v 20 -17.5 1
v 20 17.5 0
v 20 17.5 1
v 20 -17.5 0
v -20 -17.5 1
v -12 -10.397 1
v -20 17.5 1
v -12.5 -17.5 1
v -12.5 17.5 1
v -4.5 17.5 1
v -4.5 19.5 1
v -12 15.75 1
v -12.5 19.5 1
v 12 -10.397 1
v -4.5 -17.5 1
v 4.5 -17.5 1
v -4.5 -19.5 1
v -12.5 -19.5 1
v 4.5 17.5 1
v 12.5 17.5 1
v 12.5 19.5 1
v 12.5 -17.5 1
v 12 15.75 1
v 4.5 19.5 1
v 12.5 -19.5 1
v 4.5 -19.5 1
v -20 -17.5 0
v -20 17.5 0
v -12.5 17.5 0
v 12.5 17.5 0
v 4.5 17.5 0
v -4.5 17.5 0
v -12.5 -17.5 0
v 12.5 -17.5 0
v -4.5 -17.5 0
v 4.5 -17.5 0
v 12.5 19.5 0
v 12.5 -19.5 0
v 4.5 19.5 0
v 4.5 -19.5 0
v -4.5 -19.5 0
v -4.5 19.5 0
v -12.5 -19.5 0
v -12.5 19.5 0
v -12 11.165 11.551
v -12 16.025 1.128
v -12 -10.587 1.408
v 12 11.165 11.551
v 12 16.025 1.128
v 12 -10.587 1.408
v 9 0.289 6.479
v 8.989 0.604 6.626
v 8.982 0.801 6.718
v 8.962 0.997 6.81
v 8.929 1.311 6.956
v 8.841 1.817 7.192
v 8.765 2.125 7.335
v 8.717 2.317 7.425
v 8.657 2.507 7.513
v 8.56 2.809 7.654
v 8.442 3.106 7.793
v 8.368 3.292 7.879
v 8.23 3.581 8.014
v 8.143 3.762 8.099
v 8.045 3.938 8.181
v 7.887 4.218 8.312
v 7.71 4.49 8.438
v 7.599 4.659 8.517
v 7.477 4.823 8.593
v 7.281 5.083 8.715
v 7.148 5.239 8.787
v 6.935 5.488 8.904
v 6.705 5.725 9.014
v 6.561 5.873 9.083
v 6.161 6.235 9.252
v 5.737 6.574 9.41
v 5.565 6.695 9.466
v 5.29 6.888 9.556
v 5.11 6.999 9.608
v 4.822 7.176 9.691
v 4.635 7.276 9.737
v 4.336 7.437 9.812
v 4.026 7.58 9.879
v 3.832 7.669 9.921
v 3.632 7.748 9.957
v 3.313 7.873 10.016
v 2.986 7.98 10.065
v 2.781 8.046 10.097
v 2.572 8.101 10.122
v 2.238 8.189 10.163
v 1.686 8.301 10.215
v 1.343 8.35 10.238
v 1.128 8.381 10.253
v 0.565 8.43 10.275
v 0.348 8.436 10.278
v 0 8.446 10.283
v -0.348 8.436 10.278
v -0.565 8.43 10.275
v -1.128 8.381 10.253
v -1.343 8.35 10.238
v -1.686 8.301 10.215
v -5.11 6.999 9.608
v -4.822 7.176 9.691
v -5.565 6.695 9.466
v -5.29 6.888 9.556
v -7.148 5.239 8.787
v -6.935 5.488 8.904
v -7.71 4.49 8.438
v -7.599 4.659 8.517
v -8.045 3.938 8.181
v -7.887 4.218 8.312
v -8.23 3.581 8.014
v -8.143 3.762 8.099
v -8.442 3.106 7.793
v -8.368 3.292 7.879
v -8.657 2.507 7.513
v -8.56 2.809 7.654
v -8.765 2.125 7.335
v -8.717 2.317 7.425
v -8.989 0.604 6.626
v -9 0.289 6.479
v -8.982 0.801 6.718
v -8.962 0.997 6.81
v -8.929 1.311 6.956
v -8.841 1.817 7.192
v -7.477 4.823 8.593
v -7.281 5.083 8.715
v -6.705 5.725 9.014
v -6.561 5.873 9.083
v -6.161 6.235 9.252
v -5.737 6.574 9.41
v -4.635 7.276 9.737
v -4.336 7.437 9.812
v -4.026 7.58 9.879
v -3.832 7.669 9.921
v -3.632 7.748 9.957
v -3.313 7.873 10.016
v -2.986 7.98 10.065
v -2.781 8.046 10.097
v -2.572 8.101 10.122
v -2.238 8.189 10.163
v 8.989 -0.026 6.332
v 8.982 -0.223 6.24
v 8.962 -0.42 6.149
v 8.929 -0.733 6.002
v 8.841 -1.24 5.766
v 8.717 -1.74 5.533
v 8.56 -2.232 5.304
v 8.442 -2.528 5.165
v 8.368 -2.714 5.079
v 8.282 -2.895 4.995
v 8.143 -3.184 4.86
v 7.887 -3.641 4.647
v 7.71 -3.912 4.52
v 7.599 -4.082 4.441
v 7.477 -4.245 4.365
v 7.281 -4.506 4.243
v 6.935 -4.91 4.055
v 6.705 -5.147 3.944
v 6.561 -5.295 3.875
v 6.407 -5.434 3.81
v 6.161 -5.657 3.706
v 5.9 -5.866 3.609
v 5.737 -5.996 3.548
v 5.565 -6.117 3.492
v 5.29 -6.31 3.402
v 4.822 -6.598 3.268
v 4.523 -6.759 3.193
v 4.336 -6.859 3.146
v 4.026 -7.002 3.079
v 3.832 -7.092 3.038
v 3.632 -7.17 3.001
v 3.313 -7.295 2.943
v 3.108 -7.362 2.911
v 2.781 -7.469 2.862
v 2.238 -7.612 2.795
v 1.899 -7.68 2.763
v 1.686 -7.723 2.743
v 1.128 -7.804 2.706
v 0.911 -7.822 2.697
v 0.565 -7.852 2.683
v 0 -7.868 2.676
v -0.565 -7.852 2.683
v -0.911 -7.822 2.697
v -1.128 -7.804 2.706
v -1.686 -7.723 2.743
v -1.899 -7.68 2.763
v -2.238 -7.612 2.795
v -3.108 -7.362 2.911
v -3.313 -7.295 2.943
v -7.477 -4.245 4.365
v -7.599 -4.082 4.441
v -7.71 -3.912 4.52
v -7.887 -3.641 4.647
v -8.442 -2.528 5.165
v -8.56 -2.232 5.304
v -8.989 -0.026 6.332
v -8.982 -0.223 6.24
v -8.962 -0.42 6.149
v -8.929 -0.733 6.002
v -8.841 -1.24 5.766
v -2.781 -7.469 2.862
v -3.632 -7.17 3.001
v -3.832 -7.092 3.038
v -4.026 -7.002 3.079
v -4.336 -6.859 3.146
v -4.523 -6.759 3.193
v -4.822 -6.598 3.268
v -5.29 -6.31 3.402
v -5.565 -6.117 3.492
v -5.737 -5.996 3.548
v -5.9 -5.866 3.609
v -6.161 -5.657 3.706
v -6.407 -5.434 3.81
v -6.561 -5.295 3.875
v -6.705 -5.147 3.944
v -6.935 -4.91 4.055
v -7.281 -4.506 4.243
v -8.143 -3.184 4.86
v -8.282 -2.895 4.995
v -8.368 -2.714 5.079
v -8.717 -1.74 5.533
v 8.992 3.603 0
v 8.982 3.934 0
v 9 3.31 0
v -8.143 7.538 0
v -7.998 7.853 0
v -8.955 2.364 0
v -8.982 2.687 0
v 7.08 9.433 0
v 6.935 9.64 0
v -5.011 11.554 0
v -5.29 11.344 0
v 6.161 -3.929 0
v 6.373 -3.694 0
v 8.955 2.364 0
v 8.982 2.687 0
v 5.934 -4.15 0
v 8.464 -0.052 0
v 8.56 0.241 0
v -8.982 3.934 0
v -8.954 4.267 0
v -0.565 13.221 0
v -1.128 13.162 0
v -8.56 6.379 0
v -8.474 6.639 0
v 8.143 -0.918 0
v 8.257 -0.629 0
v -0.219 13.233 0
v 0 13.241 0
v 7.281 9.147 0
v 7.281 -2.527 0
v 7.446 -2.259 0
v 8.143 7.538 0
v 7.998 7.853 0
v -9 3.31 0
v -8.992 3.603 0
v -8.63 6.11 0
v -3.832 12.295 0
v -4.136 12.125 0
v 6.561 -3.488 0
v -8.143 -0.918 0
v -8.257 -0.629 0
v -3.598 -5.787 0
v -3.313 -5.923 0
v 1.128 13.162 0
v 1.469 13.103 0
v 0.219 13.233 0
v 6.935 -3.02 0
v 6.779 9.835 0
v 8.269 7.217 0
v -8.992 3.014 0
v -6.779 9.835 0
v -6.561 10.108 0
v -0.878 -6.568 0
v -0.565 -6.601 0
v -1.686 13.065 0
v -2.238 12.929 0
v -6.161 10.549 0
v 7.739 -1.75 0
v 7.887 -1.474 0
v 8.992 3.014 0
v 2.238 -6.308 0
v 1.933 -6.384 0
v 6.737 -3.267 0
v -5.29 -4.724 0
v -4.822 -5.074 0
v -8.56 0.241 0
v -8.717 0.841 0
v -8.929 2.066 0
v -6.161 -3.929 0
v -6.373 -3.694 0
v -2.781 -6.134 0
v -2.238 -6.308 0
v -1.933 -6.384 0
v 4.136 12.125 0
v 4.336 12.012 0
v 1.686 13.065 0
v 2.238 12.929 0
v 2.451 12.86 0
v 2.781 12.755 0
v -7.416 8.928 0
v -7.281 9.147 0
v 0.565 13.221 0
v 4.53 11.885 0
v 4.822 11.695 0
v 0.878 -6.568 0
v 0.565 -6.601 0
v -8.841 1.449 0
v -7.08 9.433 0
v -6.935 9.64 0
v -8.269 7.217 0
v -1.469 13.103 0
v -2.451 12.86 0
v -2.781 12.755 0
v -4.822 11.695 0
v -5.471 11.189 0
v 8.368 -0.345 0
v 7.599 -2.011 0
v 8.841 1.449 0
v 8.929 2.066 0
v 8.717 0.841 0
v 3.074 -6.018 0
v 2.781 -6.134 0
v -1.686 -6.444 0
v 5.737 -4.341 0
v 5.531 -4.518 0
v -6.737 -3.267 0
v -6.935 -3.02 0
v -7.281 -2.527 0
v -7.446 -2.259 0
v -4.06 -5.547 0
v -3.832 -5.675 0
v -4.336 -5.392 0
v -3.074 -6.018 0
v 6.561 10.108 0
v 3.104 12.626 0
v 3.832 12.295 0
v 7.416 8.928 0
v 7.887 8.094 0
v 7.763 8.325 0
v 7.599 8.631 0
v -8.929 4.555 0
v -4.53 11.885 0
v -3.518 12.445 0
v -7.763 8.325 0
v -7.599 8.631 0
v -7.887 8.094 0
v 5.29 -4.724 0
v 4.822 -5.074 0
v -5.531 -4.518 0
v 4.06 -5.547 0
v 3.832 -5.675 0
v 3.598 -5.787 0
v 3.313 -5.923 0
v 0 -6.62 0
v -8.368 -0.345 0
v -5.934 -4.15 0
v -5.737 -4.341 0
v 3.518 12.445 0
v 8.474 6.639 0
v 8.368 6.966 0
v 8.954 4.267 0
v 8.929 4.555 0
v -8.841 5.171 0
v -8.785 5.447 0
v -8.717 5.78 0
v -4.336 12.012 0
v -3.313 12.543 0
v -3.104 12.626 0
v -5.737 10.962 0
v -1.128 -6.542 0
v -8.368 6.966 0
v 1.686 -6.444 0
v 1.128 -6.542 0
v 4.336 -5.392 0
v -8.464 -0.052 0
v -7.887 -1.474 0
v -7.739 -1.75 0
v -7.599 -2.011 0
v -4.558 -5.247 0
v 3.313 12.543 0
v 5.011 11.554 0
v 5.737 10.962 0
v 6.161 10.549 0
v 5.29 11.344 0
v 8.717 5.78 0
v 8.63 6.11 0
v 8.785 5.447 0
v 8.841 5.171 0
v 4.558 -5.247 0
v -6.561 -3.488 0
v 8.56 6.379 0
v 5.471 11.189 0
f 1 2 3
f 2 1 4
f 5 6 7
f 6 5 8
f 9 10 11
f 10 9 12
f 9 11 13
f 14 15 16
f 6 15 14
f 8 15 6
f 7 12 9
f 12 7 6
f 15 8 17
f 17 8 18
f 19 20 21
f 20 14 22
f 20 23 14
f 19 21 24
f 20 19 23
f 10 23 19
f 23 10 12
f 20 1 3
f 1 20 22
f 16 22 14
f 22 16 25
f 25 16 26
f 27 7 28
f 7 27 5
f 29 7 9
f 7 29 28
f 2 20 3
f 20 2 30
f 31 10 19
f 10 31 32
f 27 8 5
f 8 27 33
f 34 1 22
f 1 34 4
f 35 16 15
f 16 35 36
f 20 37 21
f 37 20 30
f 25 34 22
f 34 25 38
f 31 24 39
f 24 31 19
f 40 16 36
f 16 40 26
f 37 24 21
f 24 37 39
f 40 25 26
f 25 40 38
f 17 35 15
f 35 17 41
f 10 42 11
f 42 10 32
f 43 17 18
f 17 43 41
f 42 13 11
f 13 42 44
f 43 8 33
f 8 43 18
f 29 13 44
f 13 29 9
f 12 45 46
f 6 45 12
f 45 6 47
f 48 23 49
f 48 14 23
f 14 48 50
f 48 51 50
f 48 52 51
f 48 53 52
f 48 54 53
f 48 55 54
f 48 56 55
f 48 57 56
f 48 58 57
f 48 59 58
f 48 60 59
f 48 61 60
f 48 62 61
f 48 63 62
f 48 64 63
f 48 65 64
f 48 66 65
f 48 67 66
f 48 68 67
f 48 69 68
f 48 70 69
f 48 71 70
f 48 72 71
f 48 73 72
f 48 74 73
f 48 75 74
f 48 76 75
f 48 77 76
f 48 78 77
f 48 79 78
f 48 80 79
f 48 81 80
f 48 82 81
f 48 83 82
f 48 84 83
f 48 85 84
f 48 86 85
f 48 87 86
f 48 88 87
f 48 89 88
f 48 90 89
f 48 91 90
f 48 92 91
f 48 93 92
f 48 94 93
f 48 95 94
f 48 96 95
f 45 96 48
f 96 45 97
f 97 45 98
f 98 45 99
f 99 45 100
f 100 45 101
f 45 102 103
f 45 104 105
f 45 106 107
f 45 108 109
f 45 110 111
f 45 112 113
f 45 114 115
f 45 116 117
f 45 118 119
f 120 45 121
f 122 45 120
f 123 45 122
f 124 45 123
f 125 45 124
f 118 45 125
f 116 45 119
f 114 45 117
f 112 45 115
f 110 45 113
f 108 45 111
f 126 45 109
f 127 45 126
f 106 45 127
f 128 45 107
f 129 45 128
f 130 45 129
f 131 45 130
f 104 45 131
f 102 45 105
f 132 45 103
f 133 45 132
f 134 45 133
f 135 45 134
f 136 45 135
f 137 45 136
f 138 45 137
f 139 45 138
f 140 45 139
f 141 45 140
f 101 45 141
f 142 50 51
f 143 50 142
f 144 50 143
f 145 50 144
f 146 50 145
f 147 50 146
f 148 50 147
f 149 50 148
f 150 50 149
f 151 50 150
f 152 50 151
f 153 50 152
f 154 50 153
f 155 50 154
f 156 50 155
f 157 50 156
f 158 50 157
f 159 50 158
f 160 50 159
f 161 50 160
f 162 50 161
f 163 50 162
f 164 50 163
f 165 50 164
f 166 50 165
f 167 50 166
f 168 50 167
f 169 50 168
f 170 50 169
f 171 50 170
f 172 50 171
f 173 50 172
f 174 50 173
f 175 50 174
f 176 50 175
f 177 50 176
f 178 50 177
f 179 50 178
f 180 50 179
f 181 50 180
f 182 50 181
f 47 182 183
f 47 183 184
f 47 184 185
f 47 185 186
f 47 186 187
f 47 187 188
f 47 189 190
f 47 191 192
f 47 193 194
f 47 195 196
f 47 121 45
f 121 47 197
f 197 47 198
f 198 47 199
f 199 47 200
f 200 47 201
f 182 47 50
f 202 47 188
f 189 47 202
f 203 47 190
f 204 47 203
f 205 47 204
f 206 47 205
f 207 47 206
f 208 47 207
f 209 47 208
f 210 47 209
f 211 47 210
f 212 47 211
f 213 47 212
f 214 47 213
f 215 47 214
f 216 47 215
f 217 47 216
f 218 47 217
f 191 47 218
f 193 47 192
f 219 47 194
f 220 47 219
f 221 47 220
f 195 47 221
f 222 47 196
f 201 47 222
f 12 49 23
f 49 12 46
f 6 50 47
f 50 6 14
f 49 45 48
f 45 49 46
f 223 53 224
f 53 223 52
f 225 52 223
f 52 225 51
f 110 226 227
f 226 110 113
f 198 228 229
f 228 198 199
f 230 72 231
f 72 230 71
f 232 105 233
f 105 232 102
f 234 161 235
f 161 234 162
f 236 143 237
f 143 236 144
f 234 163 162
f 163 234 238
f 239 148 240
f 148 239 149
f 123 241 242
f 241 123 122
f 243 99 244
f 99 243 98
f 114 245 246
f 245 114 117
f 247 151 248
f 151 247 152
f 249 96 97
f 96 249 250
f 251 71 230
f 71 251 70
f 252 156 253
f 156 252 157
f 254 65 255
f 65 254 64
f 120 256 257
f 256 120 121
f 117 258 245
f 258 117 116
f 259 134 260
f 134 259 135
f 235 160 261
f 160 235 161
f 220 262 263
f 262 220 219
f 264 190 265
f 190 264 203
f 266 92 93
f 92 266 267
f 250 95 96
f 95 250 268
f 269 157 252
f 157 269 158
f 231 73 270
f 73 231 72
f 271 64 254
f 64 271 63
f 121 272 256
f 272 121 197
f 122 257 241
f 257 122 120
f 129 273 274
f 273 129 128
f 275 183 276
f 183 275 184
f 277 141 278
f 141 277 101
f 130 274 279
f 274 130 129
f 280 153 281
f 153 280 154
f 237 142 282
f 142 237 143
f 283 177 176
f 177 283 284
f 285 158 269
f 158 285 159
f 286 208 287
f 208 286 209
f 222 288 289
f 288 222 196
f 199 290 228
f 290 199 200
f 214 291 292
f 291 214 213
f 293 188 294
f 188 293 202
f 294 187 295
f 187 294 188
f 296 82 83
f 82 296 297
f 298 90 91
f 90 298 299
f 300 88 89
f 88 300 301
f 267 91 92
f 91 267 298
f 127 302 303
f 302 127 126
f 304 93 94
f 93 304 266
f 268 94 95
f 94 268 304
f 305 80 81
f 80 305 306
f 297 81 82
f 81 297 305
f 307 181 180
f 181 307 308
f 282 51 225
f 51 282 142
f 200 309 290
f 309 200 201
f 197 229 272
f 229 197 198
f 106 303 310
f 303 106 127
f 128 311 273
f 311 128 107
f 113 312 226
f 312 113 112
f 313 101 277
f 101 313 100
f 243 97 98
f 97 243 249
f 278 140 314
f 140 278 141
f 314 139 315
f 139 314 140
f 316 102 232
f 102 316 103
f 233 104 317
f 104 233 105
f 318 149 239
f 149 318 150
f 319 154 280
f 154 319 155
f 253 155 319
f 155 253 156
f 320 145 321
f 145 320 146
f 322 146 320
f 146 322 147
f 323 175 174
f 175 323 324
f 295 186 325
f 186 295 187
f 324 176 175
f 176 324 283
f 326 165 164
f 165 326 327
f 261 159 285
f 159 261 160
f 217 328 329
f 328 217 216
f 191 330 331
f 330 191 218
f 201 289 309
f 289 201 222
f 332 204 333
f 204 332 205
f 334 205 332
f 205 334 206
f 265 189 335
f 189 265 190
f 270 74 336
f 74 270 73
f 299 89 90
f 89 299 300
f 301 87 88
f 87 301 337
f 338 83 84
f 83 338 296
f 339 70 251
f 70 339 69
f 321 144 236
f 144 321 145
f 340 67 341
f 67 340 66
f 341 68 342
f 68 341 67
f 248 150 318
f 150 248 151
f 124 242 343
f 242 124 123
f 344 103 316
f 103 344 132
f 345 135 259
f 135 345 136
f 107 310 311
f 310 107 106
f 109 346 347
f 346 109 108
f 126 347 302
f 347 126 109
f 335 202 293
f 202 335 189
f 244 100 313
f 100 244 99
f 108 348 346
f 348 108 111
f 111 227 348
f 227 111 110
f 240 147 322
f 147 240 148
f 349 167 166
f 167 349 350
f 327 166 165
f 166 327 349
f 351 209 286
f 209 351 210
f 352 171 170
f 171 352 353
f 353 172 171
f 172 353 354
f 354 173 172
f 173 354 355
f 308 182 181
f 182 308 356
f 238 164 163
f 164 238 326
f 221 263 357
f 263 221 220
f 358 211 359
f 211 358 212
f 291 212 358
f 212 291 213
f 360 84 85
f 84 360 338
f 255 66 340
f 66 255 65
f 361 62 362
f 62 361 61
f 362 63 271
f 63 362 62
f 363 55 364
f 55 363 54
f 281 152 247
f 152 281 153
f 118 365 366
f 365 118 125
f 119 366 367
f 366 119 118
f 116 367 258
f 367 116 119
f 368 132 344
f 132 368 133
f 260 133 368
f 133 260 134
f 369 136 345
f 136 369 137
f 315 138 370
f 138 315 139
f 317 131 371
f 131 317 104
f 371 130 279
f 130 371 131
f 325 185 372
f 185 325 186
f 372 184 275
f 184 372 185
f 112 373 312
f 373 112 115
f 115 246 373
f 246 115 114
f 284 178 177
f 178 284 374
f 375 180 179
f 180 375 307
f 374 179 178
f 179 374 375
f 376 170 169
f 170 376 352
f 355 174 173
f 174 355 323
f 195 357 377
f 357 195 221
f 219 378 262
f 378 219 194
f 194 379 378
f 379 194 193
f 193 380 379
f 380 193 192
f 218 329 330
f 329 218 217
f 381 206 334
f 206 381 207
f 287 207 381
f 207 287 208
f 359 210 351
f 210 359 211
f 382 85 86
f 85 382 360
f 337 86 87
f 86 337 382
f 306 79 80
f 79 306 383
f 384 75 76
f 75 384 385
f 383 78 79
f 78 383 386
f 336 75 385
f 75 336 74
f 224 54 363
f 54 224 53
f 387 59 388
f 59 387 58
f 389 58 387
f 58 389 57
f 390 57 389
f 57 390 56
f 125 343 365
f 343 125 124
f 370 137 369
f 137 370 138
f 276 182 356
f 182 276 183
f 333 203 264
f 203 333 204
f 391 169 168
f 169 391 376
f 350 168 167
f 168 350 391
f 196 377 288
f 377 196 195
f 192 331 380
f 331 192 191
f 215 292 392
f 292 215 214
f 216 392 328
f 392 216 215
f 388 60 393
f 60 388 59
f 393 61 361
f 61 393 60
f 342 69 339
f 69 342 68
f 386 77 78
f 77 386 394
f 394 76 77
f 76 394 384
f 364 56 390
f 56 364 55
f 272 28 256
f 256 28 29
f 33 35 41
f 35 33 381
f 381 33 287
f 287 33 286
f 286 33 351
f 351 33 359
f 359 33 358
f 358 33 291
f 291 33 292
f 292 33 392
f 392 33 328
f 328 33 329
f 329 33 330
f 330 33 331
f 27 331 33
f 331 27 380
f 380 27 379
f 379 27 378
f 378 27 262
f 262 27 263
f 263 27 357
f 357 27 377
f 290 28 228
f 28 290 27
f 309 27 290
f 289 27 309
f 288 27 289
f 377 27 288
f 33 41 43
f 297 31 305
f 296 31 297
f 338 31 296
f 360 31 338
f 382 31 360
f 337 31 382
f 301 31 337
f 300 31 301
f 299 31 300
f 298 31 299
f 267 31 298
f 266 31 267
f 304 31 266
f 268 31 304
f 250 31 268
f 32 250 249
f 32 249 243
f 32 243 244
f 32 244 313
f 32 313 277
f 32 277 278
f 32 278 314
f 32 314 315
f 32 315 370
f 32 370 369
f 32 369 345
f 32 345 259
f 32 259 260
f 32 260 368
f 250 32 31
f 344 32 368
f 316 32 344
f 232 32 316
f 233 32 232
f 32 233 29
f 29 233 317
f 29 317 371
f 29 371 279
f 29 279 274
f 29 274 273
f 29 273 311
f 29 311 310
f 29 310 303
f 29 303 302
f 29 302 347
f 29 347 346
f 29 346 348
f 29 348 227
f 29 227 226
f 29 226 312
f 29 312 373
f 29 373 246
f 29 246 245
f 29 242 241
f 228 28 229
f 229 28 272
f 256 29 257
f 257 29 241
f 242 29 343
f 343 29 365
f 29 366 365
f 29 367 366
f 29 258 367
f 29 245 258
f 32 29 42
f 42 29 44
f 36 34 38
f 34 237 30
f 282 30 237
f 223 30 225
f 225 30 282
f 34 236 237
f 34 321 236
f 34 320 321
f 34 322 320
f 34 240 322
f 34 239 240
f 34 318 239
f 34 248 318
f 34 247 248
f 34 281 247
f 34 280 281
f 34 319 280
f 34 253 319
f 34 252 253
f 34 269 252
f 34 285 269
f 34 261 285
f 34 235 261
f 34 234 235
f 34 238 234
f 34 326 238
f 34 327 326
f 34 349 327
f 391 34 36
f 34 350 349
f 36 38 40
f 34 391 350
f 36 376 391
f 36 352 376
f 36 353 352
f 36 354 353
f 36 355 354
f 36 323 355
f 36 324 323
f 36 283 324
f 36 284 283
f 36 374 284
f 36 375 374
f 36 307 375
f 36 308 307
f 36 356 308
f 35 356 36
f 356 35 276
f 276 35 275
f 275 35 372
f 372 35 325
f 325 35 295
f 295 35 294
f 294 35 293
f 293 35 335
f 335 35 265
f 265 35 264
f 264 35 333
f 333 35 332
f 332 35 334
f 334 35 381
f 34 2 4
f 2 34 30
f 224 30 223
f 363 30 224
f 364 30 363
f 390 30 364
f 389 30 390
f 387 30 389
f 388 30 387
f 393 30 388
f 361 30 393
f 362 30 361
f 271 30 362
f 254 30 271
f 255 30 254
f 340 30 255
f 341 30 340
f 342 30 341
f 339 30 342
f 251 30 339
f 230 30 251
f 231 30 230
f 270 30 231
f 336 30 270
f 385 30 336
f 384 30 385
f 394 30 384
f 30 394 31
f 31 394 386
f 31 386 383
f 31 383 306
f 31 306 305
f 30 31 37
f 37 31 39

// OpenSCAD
$fn=100*1;
//desired angle
angle=25;  // [0:35]
//verical offset of camera
voff=3; //[-4:5,]
//Thickness of angled prortion
setback=10.5; //[-8:20]

tw=8.5*1;
tc=8.5*1;
th=2*1;


difference(){
    union(){
        //Main plate
        cube([40,35,th],center=true);
        //Tabs
        translate([tc,0,0])
         cube([8,39,th],center=true);
        mirror([1, 0, 0])
         translate([tc,0,0])
          cube([8,39,th],center=true);     
        //Angle
        rotate([angle,0,0])
         translate([0,voff,0])
         cube([24,24,12-(11-setback)],center=true);
    }
    
    //cam hole
    rotate([angle,0,0])
     translate([0,voff,0])
      cylinder(h=50,r=9,center=true);
    
    //clean up the front
    translate([-25,-25,-50])
     cube([50,50,50]);
}
